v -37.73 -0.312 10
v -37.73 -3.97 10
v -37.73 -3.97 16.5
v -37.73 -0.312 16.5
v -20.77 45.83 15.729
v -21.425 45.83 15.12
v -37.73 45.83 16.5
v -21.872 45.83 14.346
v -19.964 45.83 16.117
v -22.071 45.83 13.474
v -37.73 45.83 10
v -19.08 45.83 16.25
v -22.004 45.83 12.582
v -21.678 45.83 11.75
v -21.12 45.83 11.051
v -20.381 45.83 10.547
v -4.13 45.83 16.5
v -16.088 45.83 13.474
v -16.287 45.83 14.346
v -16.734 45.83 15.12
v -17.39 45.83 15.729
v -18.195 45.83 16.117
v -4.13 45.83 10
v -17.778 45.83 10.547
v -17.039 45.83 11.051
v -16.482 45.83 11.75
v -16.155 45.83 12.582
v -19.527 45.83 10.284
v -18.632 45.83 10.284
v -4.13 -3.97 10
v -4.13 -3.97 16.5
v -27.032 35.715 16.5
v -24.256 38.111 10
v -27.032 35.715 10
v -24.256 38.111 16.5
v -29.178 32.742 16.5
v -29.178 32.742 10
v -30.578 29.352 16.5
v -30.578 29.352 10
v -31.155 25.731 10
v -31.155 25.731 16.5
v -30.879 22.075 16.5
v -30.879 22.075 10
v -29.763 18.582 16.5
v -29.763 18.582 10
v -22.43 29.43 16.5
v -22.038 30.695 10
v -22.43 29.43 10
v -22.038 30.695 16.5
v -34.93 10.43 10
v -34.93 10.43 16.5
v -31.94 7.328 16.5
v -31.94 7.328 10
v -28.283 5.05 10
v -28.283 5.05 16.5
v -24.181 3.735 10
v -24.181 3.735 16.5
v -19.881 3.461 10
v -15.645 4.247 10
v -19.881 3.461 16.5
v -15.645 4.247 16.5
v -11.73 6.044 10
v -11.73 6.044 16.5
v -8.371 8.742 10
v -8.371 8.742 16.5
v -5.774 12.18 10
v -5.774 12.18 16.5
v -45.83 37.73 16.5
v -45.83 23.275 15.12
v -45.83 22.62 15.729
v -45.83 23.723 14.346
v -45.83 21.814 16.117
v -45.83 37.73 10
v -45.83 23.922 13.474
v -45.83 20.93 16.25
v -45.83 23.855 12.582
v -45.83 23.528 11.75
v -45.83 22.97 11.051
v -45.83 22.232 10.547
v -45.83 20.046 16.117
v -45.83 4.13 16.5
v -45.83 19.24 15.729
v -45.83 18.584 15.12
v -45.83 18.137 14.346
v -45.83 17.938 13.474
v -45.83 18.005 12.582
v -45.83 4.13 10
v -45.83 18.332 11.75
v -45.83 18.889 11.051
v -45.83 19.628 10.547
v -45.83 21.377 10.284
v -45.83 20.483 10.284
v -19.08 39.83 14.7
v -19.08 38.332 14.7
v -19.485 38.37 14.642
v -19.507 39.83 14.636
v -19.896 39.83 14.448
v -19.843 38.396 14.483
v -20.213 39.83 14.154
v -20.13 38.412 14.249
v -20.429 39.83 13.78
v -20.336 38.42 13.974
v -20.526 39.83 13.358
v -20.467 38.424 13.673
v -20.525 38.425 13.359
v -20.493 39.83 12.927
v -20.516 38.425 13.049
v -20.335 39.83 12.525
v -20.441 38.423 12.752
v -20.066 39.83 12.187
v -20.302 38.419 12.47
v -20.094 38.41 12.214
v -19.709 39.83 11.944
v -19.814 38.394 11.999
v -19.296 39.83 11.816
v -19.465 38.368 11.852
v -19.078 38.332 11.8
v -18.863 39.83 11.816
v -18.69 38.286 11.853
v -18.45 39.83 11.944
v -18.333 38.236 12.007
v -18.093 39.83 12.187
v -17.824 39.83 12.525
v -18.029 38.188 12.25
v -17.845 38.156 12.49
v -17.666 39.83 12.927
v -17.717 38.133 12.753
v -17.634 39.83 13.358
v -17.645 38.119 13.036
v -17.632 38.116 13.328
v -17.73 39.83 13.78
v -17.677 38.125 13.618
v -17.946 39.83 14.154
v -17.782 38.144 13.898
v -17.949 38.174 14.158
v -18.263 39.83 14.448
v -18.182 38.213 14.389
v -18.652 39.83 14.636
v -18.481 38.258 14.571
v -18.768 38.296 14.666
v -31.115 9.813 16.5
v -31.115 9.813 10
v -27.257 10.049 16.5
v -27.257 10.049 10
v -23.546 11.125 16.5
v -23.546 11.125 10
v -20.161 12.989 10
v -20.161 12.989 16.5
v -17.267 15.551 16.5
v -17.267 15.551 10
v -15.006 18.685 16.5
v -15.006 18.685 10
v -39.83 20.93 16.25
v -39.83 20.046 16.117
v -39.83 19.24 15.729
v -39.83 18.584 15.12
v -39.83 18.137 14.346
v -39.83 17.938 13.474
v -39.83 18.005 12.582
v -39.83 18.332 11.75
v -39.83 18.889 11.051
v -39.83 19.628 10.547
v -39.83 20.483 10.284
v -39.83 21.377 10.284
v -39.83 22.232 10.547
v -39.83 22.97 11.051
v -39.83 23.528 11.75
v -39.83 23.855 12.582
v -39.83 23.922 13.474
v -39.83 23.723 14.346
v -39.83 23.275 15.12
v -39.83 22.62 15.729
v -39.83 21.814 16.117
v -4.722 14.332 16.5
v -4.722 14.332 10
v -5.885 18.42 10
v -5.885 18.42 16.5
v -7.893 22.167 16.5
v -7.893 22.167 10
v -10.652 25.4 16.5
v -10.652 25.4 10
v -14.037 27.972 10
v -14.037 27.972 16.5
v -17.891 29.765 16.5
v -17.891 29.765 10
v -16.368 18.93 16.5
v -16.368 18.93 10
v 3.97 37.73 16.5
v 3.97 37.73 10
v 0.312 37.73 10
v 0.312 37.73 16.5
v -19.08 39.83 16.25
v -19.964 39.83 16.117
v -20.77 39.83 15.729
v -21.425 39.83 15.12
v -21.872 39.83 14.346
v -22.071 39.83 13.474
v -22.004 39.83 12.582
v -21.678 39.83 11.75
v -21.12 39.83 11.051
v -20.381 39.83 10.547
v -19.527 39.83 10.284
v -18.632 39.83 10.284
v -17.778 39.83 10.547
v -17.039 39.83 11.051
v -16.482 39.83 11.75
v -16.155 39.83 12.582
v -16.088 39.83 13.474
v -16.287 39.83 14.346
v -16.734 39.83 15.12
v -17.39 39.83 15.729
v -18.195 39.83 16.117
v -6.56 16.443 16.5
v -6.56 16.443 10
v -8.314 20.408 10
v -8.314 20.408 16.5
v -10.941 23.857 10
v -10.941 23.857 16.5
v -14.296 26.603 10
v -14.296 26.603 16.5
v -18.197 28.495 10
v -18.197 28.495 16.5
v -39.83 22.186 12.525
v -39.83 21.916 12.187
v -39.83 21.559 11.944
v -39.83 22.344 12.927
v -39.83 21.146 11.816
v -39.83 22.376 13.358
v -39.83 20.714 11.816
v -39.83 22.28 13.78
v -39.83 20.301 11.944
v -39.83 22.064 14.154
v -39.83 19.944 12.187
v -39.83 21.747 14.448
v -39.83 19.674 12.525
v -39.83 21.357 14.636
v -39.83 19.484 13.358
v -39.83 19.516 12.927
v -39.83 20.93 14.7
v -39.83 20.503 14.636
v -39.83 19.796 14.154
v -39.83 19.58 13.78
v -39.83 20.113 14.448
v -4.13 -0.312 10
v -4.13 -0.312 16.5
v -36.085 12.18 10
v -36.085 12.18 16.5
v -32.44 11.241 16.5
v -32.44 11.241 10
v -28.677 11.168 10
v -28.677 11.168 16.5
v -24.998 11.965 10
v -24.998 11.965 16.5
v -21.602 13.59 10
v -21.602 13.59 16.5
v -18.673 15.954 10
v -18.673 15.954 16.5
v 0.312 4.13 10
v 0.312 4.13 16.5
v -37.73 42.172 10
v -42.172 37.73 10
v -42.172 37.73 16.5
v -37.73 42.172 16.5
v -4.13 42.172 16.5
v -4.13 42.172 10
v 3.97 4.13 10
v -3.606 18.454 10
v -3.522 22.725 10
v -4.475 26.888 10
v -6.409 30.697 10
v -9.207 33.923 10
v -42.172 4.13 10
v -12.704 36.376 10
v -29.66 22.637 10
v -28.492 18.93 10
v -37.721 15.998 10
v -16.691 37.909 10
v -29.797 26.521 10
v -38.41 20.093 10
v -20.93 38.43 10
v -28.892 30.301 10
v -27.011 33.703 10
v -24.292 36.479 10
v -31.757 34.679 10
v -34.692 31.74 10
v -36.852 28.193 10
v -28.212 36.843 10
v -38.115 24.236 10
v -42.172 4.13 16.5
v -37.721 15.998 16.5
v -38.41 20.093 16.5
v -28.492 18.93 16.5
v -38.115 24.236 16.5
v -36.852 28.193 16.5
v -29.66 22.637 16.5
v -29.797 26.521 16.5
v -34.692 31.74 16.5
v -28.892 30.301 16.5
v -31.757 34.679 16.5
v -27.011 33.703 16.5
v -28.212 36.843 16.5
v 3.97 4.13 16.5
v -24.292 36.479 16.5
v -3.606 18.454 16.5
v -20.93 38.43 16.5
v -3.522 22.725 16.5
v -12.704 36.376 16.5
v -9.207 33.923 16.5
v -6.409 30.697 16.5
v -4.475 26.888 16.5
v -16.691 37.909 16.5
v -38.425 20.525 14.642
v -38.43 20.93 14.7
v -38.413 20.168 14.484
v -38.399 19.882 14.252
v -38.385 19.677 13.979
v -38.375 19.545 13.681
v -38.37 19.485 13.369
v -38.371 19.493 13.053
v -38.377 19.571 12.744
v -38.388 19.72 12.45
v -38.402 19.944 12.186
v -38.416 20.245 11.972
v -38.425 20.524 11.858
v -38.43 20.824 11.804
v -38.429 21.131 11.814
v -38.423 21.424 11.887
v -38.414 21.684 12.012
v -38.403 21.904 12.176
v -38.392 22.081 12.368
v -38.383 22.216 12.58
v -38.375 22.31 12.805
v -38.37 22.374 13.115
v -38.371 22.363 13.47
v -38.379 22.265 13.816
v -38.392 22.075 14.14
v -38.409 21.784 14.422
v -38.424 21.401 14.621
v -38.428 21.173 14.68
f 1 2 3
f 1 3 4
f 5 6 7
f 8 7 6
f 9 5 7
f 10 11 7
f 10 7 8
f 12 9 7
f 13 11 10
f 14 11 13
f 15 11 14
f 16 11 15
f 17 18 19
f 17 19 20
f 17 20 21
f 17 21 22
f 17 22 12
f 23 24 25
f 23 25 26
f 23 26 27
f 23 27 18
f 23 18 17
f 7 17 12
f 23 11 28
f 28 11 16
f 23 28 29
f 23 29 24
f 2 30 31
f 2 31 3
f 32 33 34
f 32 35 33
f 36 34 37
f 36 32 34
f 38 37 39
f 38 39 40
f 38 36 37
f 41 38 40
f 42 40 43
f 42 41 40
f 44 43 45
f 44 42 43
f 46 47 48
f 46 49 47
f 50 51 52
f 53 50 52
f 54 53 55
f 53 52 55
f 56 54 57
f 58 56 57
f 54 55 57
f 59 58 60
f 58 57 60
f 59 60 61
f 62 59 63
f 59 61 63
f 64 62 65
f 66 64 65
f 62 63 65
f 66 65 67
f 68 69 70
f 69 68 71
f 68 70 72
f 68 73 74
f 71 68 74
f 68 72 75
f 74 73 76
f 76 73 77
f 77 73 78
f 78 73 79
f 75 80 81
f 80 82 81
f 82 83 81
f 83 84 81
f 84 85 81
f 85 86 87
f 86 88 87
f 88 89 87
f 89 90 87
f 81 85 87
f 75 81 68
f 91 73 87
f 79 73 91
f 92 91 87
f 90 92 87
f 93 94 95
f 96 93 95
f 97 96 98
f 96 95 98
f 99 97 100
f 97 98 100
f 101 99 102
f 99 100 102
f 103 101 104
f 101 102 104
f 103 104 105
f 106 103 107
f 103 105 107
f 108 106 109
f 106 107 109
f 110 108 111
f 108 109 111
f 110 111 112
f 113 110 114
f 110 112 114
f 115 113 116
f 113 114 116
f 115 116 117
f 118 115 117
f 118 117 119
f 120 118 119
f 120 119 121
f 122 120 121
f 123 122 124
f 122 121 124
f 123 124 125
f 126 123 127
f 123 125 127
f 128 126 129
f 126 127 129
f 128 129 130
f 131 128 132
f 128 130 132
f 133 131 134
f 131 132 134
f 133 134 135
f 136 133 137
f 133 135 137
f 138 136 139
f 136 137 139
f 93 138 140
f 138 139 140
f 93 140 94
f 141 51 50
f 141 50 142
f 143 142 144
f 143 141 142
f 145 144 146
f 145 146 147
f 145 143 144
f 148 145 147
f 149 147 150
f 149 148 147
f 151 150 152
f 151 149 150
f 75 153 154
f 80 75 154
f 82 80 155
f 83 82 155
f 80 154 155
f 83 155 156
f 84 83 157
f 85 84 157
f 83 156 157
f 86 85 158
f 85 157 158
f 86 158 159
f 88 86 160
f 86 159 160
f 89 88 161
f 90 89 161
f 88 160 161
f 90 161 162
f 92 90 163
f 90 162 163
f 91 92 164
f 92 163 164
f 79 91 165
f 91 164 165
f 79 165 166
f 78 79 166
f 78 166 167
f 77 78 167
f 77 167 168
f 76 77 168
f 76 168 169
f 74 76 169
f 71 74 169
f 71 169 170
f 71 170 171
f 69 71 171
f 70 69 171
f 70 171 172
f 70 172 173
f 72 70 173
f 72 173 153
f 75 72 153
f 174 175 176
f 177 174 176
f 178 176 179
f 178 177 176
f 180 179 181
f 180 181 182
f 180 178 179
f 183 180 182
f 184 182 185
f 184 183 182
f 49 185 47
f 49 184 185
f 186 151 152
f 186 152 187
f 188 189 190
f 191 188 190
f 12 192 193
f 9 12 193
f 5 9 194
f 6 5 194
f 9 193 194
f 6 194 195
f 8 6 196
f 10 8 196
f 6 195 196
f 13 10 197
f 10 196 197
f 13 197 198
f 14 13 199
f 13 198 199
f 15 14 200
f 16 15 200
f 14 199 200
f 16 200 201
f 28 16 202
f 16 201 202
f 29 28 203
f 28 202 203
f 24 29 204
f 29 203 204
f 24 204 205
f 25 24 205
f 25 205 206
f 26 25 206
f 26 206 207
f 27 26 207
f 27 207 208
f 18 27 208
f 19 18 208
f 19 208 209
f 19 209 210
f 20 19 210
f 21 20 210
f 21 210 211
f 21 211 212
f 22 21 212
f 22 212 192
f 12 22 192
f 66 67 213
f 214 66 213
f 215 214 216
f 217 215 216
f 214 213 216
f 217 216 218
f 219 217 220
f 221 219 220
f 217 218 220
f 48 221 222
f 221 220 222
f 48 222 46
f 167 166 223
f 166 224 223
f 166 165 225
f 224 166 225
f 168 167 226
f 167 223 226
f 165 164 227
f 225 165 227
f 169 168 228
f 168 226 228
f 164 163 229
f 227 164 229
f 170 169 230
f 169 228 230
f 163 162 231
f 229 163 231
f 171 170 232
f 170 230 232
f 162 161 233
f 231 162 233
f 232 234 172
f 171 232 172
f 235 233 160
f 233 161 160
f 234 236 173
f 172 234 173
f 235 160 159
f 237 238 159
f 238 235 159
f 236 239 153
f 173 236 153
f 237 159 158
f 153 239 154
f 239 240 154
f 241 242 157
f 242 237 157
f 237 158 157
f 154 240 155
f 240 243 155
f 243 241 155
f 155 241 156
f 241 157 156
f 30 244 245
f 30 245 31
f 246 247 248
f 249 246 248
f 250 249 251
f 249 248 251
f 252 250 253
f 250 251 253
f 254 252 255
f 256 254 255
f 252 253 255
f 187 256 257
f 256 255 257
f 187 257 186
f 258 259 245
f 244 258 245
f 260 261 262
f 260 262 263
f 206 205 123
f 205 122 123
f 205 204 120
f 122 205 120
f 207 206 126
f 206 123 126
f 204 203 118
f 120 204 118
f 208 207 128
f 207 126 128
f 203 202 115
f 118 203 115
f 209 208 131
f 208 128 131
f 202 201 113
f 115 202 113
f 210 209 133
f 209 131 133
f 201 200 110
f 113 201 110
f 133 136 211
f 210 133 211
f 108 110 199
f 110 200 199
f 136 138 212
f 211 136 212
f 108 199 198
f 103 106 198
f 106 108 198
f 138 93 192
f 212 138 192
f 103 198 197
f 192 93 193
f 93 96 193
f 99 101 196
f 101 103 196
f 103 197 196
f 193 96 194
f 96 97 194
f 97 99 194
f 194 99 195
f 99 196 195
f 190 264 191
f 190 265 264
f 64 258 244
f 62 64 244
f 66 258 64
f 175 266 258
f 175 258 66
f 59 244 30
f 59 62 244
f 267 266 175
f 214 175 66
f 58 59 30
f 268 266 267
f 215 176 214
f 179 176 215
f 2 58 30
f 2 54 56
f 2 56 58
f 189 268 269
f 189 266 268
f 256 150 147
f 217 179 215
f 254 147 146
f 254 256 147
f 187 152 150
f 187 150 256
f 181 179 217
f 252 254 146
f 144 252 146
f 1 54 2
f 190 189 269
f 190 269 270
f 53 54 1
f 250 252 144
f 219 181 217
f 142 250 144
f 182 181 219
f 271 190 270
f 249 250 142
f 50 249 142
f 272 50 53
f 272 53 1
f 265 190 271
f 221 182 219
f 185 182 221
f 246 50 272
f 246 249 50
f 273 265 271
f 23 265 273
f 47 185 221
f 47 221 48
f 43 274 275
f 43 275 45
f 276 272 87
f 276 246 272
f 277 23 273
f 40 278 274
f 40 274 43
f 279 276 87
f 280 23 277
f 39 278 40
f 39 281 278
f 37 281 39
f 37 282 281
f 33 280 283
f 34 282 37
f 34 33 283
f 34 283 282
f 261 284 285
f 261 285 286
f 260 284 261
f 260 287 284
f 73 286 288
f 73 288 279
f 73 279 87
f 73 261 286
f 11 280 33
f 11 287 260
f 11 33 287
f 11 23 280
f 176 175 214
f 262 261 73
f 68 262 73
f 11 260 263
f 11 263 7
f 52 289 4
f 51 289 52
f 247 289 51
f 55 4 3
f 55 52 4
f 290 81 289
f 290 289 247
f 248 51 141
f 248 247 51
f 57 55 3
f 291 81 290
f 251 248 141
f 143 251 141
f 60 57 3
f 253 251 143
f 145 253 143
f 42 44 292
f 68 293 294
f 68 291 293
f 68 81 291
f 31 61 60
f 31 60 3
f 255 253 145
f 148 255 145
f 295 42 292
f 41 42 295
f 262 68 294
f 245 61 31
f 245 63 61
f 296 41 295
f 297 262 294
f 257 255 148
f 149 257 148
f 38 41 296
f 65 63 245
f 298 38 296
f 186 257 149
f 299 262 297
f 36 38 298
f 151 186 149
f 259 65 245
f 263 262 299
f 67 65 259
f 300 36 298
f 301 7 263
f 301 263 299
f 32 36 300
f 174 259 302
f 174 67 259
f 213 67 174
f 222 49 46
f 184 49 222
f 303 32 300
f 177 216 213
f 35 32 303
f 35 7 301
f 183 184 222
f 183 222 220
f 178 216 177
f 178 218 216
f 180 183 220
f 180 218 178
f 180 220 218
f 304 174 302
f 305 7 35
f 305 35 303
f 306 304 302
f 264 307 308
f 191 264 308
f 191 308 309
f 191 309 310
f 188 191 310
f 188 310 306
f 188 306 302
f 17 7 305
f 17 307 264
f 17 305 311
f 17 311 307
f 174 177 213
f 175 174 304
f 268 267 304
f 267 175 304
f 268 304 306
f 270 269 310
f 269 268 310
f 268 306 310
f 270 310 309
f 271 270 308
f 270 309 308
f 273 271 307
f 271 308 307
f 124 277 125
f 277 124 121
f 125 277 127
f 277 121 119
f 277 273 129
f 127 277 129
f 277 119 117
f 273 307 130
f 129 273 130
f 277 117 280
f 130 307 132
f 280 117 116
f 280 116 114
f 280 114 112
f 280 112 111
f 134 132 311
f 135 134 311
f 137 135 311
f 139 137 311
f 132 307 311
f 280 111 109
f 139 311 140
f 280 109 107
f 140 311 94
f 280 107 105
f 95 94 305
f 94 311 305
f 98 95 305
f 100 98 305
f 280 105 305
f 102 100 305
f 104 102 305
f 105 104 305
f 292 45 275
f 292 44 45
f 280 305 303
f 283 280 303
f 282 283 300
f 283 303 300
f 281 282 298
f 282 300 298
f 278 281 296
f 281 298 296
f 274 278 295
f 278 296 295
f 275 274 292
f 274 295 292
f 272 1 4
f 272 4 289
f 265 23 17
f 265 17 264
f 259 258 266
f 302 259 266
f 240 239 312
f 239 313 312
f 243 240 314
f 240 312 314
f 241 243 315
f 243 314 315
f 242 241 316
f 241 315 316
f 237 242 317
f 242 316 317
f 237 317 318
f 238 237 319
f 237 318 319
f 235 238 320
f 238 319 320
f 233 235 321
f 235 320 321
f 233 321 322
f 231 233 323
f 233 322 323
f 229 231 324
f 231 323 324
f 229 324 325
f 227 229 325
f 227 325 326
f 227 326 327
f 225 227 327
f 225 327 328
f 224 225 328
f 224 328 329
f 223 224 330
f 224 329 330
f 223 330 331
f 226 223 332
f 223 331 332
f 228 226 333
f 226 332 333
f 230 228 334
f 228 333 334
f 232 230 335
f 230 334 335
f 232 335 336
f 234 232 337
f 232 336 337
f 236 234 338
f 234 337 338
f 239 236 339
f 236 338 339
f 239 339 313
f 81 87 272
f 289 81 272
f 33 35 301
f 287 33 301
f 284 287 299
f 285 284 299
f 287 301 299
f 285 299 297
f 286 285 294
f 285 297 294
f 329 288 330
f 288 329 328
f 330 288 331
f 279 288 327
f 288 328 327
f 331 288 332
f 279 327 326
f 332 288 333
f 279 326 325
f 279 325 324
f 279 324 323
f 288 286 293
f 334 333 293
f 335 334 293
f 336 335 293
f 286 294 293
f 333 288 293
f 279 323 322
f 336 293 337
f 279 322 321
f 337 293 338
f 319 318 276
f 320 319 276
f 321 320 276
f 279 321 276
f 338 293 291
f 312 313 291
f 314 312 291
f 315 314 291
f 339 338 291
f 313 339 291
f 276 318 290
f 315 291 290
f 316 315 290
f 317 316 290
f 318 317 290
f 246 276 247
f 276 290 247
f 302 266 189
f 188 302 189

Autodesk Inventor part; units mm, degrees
ref_plane "YZ Plane" through (0, 0, 0) normal (1, 0, 0) x (0, 1, 0)
ref_plane "Work Plane1" through (0, 0, 10) normal (0, 0, 1) x (1, 0, 0)
sketch "Sketch1" plane through (0, 0, 10) normal (0, 0, 1) x (1, 0, 0)
  line L0 (-4.0299, -0.3538) -> (-2.2322, 1.4439) construction
  arc A0 (-1.4439, 2.2322) -> (-2.2322, 1.4439) centre (-0.9299, 0.9299) ccw construction
  line L1 (-1.4439, 2.2322) -> (0.3538, 4.0299) construction
  line L2 (-37.8299, 42.2137) -> (-37.8299, 45.8299) construction
  line L3 (-37.8299, 45.8299) -> (-4.0299, 45.8299) construction
  line L4 (-4.0299, 45.8299) -> (-4.0299, 42.2137) construction
  line L5 (-4.0299, 4.0299) -> (0.3538, 4.0299) projected
  line L6 (-20.9299, 58.9723) -> (17.1124, 20.9299) construction
  line L7 (17.1124, 20.9299) -> (-20.9299, -17.1124) construction
  line L8 (-20.9299, -17.1124) -> (-58.9723, 20.9299) construction
  line L9 (-58.9723, 20.9299) -> (-20.9299, 58.9723) construction
  line L10 (-20.9299, 58.9723) -> (-20.9299, -17.1124) construction
  line L11 (17.1124, 20.9299) -> (-58.9723, 20.9299) construction
  line L12 (-20.9299, 58.9723) -> (32.8701, 58.9723) construction
  line L13 (-43.4299, 43.4299) -> (1.5701, 43.4299) construction
  line L14 (1.5701, 43.4299) -> (1.5701, -1.5701) construction
  line L15 (1.5701, -1.5701) -> (-43.4299, -1.5701) construction
  line L16 (-43.4299, -1.5701) -> (-43.4299, 43.4299) construction
  line L17 (-43.4299, 43.4299) -> (1.5701, -1.5701) construction
  line L18 (1.5701, 43.4299) -> (-43.4299, -1.5701) construction
  line L19 (-43.4299, 5.3876) -> (-43.4299, 36.4723)
  line L20 (-43.4299, 36.4723) -> (-36.4723, 43.4299)
  line L21 (-36.4723, 43.4299) -> (-5.3876, 43.4299)
  line L22 (-5.3876, 43.4299) -> (1.5701, 36.4723)
  line L23 (1.5701, 36.4723) -> (1.5701, 5.3876)
  line L24 (1.5701, 5.3876) -> (-5.3876, -1.5701)
  line L25 (-5.3876, -1.5701) -> (-36.4723, -1.5701)
  line L26 (-36.4723, -1.5701) -> (-43.4299, 5.3876)
  line L27 (-4.0299, 42.2137) -> (-37.8299, 42.2137) projected
  line L28 (-4.0299, -0.3538) -> (-4.0299, 4.0299) projected
  circle A1 centre (-20.9299, 20.9299) radius 13.3985
  circle A2 centre (-20.9299, 20.9299) radius 15.4895
  point P0 (-37.8299, 4.0299)
  dimension "d18" = 53.8
  dimension "d19" = 45
  dimension "d20" = 53.8
  dimension "d21" = 45
  dimension "d22" = 45
  dimension "d30" = 26.797
  dimension "d36" = 30.979
extrude "Extrusion1" add sketch "Sketch1" along normal blind 6.5 contours L28 L24 L25 L26 L19 L20 L27 L22 L23 L5 | L5 L24 L28 | L27 L20 L21 L22 | A1 | A2
ref_plane "Work Plane2" through (-40.9959, 0.8639, 22.2359) normal (0, 0, 1) x (1, 0, 0)
sketch "Sketch3" plane through (0, 0, 10) normal (0, 0, -1) x (-1, 0, 0)
  line L0 (37.8299, -0.4701) -> (37.8299, 4.0299) construction
  line L1 (4.0299, 4.0299) -> (4.0299, -0.4701) construction
  line L2 (37.8299, -0.4701) -> (37.8299, 1.1886) construction
  line L3 (4.0299, -3.9701) -> (4.0299, -0.3538) construction
  line L4 (45.8299, 4.0299) -> (42.2137, 4.0299) construction
  line L5 (-0.3538, 4.0299) -> (-3.9701, 4.0299) construction
  line L6 (-3.9701, 37.8299) -> (-0.3538, 37.8299) construction
  line L7 (4.0299, 42.2137) -> (4.0299, 45.8299) construction
  line L8 (37.8299, 45.8299) -> (37.8299, 42.2137) construction
  line L9 (42.2137, 37.8299) -> (45.8299, 37.8299) construction
  line L10 (37.8299, 37.7299) -> (45.8299, 37.7299)
  line L11 (45.8299, 37.7299) -> (45.8299, 4.1299)
  line L12 (45.8299, 4.1299) -> (37.8299, 4.1299)
  line L13 (37.8299, 4.1299) -> (37.8299, 37.7299)
  line L14 (37.7299, 4.0299) -> (4.1299, 4.0299)
  line L15 (4.1299, 4.0299) -> (4.1299, -3.9701)
  line L16 (4.1299, -3.9701) -> (37.7299, -3.9701)
  line L17 (37.7299, -3.9701) -> (37.7299, 4.0299)
  line L18 (4.0299, 4.1299) -> (-3.9701, 4.1299)
  line L19 (-3.9701, 4.1299) -> (-3.9701, 37.7299)
  line L20 (-3.9701, 37.7299) -> (4.0299, 37.7299)
  line L21 (4.0299, 37.7299) -> (4.0299, 4.1299)
  line L22 (4.1299, 37.8299) -> (37.7299, 37.8299)
  line L23 (37.7299, 37.8299) -> (37.7299, 45.8299)
  line L24 (37.7299, 45.8299) -> (4.1299, 45.8299)
  line L25 (4.1299, 45.8299) -> (4.1299, 37.8299)
  point P0 (0, 0)
  dimension "d23" = 0.1
  dimension "d24" = 0.1
  dimension "d25" = 0.1
  dimension "d26" = 0.1
  dimension "d27" = 0.1
extrude "Extrusion3" add sketch "Sketch3" against normal up to surface (6.5 mm away)
sketch "Sketch6" plane through (0, 0, 16.5) normal (0, 0, 1) x (1, 0, 0)
  circle A0 centre (-20.9299, 20.9299) radius 17.5
  circle A1 centre (-20.9299, 20.9299) radius 13.3985
  line L0 (-45.8299, 4.1299) -> (-45.8299, 37.7299) projected
  line L1 (-4.1299, -3.9701) -> (-37.7299, -3.9701) projected
  line L2 (-37.7299, 45.8299) -> (-4.1299, 45.8299) projected
  point P0 (0, 0)
  point P1 (-45.8299, 20.9299)
  point P2 (-20.9299, -3.9701)
  point P3 (-20.9299, 45.8299)
  dimension "d37" = 26.797
  dimension "d38" = 35
extrude "Extrusion5" cut sketch "Sketch6" against normal blind 12 contours A0 | A1
sketch "Sketch7" plane through (0, 0, 16.5) normal (0, 0, 1) x (1, 0, 0)
  circle A0 centre (-20.9299, 20.9299) radius 17.5 construction
  line L0 (3.9701, 4.1299) -> (0.3124, 4.1299) construction
  line L1 (3.9701, 37.7299) -> (3.9701, 4.1299) construction
  line L2 (0.3124, 37.7299) -> (3.9701, 37.7299) construction
  line L3 (0.3124, 37.7299) -> (-4.1299, 42.1723) construction
  line L4 (-4.1299, 45.8299) -> (-4.1299, 42.1723) construction
  line L5 (-37.7299, 45.8299) -> (-4.1299, 45.8299) construction
  line L6 (-37.7299, 42.1723) -> (-37.7299, 45.8299) construction
  line L7 (-37.7299, 42.1723) -> (-42.1723, 37.7299) construction
  line L8 (-45.8299, 37.7299) -> (-42.1723, 37.7299) construction
  line L9 (-45.8299, 4.1299) -> (-45.8299, 37.7299) construction
  line L10 (-42.1723, 4.1299) -> (-45.8299, 4.1299) construction
  line L11 (-42.1723, 4.1299) -> (-37.7299, -0.3124) construction
  line L12 (-37.7299, -3.9701) -> (-37.7299, -0.3124) construction
  line L13 (-4.1299, -3.9701) -> (-37.7299, -3.9701) construction
  line L14 (-4.1299, -0.3124) -> (-4.1299, -3.9701) construction
  line L15 (-4.1299, -0.3124) -> (0.3124, 4.1299) construction
  circle A1 centre (-20.9299, 20.9299) radius 17.5 construction
  line L16 (-5.7745, 12.1799) -> (-36.0854, 12.1799) construction
  line L17 (-36.0854, 12.1799) -> (-20.9299, 38.4299) construction
  line L18 (-20.9299, 38.4299) -> (-5.7745, 12.1799) construction
  circle A2 centre (-22.4299, 22.4299) radius 7 construction
  arc A3 (-20.9299, 38.4299) -> (-24.2565, 38.1108) centre (-20.9299, 20.9299) ccw
  line L19 (-28.4921, 18.9299) -> (-22.4299, 29.4299)
  line L20 (-22.4299, 29.4299) -> (-16.3678, 18.9299)
  line L21 (-16.3678, 18.9299) -> (-28.4921, 18.9299)
  arc A4 (-20.9299, 38.4299) -> (-28.4921, 18.9299) centre (-15.4327, 25.0818) ccw
  arc A5 (-24.2565, 38.1108) -> (-29.7634, 18.5819) centre (-15.4327, 25.0818) ccw
  line L22 (-29.7634, 18.5819) -> (-28.4921, 18.9299)
  arc A6 (-5.7745, 12.1799) -> (-22.4299, 29.4299) centre (-24.2867, 10.9714) ccw
  arc A7 (-5.7745, 12.1799) -> (-4.7215, 14.3316) centre (-20.9299, 20.9299) ccw
  arc A8 (-4.7215, 14.3316) -> (-22.0384, 30.6954) centre (-24.2867, 10.9714) ccw
  line L23 (-22.0384, 30.6954) -> (-22.4299, 29.4299)
  arc A9 (-36.0854, 12.1799) -> (-16.3678, 18.9299) centre (-30.247, 27.2992) ccw
  arc A10 (-36.0854, 12.1799) -> (-34.9298, 10.4297) centre (-20.9299, 20.9299) ccw
  arc A11 (-34.9298, 10.4297) -> (-15.0056, 18.6848) centre (-30.247, 27.2992) ccw
  line L24 (-15.0056, 18.6848) -> (-16.3678, 18.9299)
  dimension "d93" = 14
  dimension "d94" = 1.5
  dimension "d95" = 1.5
  dimension "d96" = 1.3
  dimension "d97" = 1.3
  dimension "d98" = 1.3
extrude "Extrusion6" add sketch "Sketch7" against normal up to surface (6.5 mm away) contours A4 L22 A5 A3 | L23 A8 A7 A6 | L24 A11 A10 A9
sketch "Sketch8" plane through (-37.7299, 45.8299, 10) normal (0, 1, 0) x (1, 0, 0)
  line L0 (0, 0) -> (33.6, 0) projected
  line L1 (0, -6.5) -> (33.6, -6.5) projected
  line L2 (33.6, 0) -> (33.6, -6.5) projected
  line L3 (0, 0) -> (0, -6.5) projected
  point P0 (37.7299, 10)
  point P1 (16.8, -3.25)
  point P2 (16.8, 0)
  point P3 (16.8, -6.5)
  point P4 (33.6, -3.25)
  point P5 (0, -3.25)
  point P6 (18.6503, -3.25)
hole "Hole1" at (-19.0796, 45.8299, 13.25) direction (0, -1, 0) diameter 2.9 depth 11 tip angle 118 counterbore diameter 6 counterbore depth 6
sketch "Sketch9" plane through (-45.8299, 4.1299, 10) normal (1, 0, 0) x (0, 0, -1)
  line L0 (0, 0) -> (0, 33.6) projected
  line L1 (-6.5, 33.6) -> (-6.5, 0) projected
  line L2 (0, 33.6) -> (-6.5, 33.6) projected
  line L3 (0, 0) -> (-6.5, 0) projected
  point P0 (10, -4.1299)
  point P1 (-3.25, 16.8)
  point P2 (0, 16.8)
  point P3 (-6.5, 16.8)
  point P4 (-3.25, 33.6)
  point P5 (-3.25, 0)
hole "Hole2" at (-45.8299, 20.9299, 13.25) direction (1, 0, 0) diameter 2.9 depth 11 tip angle 118 counterbore diameter 6 counterbore depth 6
properties part number "50_Cube_Insert_Thorlabs"
